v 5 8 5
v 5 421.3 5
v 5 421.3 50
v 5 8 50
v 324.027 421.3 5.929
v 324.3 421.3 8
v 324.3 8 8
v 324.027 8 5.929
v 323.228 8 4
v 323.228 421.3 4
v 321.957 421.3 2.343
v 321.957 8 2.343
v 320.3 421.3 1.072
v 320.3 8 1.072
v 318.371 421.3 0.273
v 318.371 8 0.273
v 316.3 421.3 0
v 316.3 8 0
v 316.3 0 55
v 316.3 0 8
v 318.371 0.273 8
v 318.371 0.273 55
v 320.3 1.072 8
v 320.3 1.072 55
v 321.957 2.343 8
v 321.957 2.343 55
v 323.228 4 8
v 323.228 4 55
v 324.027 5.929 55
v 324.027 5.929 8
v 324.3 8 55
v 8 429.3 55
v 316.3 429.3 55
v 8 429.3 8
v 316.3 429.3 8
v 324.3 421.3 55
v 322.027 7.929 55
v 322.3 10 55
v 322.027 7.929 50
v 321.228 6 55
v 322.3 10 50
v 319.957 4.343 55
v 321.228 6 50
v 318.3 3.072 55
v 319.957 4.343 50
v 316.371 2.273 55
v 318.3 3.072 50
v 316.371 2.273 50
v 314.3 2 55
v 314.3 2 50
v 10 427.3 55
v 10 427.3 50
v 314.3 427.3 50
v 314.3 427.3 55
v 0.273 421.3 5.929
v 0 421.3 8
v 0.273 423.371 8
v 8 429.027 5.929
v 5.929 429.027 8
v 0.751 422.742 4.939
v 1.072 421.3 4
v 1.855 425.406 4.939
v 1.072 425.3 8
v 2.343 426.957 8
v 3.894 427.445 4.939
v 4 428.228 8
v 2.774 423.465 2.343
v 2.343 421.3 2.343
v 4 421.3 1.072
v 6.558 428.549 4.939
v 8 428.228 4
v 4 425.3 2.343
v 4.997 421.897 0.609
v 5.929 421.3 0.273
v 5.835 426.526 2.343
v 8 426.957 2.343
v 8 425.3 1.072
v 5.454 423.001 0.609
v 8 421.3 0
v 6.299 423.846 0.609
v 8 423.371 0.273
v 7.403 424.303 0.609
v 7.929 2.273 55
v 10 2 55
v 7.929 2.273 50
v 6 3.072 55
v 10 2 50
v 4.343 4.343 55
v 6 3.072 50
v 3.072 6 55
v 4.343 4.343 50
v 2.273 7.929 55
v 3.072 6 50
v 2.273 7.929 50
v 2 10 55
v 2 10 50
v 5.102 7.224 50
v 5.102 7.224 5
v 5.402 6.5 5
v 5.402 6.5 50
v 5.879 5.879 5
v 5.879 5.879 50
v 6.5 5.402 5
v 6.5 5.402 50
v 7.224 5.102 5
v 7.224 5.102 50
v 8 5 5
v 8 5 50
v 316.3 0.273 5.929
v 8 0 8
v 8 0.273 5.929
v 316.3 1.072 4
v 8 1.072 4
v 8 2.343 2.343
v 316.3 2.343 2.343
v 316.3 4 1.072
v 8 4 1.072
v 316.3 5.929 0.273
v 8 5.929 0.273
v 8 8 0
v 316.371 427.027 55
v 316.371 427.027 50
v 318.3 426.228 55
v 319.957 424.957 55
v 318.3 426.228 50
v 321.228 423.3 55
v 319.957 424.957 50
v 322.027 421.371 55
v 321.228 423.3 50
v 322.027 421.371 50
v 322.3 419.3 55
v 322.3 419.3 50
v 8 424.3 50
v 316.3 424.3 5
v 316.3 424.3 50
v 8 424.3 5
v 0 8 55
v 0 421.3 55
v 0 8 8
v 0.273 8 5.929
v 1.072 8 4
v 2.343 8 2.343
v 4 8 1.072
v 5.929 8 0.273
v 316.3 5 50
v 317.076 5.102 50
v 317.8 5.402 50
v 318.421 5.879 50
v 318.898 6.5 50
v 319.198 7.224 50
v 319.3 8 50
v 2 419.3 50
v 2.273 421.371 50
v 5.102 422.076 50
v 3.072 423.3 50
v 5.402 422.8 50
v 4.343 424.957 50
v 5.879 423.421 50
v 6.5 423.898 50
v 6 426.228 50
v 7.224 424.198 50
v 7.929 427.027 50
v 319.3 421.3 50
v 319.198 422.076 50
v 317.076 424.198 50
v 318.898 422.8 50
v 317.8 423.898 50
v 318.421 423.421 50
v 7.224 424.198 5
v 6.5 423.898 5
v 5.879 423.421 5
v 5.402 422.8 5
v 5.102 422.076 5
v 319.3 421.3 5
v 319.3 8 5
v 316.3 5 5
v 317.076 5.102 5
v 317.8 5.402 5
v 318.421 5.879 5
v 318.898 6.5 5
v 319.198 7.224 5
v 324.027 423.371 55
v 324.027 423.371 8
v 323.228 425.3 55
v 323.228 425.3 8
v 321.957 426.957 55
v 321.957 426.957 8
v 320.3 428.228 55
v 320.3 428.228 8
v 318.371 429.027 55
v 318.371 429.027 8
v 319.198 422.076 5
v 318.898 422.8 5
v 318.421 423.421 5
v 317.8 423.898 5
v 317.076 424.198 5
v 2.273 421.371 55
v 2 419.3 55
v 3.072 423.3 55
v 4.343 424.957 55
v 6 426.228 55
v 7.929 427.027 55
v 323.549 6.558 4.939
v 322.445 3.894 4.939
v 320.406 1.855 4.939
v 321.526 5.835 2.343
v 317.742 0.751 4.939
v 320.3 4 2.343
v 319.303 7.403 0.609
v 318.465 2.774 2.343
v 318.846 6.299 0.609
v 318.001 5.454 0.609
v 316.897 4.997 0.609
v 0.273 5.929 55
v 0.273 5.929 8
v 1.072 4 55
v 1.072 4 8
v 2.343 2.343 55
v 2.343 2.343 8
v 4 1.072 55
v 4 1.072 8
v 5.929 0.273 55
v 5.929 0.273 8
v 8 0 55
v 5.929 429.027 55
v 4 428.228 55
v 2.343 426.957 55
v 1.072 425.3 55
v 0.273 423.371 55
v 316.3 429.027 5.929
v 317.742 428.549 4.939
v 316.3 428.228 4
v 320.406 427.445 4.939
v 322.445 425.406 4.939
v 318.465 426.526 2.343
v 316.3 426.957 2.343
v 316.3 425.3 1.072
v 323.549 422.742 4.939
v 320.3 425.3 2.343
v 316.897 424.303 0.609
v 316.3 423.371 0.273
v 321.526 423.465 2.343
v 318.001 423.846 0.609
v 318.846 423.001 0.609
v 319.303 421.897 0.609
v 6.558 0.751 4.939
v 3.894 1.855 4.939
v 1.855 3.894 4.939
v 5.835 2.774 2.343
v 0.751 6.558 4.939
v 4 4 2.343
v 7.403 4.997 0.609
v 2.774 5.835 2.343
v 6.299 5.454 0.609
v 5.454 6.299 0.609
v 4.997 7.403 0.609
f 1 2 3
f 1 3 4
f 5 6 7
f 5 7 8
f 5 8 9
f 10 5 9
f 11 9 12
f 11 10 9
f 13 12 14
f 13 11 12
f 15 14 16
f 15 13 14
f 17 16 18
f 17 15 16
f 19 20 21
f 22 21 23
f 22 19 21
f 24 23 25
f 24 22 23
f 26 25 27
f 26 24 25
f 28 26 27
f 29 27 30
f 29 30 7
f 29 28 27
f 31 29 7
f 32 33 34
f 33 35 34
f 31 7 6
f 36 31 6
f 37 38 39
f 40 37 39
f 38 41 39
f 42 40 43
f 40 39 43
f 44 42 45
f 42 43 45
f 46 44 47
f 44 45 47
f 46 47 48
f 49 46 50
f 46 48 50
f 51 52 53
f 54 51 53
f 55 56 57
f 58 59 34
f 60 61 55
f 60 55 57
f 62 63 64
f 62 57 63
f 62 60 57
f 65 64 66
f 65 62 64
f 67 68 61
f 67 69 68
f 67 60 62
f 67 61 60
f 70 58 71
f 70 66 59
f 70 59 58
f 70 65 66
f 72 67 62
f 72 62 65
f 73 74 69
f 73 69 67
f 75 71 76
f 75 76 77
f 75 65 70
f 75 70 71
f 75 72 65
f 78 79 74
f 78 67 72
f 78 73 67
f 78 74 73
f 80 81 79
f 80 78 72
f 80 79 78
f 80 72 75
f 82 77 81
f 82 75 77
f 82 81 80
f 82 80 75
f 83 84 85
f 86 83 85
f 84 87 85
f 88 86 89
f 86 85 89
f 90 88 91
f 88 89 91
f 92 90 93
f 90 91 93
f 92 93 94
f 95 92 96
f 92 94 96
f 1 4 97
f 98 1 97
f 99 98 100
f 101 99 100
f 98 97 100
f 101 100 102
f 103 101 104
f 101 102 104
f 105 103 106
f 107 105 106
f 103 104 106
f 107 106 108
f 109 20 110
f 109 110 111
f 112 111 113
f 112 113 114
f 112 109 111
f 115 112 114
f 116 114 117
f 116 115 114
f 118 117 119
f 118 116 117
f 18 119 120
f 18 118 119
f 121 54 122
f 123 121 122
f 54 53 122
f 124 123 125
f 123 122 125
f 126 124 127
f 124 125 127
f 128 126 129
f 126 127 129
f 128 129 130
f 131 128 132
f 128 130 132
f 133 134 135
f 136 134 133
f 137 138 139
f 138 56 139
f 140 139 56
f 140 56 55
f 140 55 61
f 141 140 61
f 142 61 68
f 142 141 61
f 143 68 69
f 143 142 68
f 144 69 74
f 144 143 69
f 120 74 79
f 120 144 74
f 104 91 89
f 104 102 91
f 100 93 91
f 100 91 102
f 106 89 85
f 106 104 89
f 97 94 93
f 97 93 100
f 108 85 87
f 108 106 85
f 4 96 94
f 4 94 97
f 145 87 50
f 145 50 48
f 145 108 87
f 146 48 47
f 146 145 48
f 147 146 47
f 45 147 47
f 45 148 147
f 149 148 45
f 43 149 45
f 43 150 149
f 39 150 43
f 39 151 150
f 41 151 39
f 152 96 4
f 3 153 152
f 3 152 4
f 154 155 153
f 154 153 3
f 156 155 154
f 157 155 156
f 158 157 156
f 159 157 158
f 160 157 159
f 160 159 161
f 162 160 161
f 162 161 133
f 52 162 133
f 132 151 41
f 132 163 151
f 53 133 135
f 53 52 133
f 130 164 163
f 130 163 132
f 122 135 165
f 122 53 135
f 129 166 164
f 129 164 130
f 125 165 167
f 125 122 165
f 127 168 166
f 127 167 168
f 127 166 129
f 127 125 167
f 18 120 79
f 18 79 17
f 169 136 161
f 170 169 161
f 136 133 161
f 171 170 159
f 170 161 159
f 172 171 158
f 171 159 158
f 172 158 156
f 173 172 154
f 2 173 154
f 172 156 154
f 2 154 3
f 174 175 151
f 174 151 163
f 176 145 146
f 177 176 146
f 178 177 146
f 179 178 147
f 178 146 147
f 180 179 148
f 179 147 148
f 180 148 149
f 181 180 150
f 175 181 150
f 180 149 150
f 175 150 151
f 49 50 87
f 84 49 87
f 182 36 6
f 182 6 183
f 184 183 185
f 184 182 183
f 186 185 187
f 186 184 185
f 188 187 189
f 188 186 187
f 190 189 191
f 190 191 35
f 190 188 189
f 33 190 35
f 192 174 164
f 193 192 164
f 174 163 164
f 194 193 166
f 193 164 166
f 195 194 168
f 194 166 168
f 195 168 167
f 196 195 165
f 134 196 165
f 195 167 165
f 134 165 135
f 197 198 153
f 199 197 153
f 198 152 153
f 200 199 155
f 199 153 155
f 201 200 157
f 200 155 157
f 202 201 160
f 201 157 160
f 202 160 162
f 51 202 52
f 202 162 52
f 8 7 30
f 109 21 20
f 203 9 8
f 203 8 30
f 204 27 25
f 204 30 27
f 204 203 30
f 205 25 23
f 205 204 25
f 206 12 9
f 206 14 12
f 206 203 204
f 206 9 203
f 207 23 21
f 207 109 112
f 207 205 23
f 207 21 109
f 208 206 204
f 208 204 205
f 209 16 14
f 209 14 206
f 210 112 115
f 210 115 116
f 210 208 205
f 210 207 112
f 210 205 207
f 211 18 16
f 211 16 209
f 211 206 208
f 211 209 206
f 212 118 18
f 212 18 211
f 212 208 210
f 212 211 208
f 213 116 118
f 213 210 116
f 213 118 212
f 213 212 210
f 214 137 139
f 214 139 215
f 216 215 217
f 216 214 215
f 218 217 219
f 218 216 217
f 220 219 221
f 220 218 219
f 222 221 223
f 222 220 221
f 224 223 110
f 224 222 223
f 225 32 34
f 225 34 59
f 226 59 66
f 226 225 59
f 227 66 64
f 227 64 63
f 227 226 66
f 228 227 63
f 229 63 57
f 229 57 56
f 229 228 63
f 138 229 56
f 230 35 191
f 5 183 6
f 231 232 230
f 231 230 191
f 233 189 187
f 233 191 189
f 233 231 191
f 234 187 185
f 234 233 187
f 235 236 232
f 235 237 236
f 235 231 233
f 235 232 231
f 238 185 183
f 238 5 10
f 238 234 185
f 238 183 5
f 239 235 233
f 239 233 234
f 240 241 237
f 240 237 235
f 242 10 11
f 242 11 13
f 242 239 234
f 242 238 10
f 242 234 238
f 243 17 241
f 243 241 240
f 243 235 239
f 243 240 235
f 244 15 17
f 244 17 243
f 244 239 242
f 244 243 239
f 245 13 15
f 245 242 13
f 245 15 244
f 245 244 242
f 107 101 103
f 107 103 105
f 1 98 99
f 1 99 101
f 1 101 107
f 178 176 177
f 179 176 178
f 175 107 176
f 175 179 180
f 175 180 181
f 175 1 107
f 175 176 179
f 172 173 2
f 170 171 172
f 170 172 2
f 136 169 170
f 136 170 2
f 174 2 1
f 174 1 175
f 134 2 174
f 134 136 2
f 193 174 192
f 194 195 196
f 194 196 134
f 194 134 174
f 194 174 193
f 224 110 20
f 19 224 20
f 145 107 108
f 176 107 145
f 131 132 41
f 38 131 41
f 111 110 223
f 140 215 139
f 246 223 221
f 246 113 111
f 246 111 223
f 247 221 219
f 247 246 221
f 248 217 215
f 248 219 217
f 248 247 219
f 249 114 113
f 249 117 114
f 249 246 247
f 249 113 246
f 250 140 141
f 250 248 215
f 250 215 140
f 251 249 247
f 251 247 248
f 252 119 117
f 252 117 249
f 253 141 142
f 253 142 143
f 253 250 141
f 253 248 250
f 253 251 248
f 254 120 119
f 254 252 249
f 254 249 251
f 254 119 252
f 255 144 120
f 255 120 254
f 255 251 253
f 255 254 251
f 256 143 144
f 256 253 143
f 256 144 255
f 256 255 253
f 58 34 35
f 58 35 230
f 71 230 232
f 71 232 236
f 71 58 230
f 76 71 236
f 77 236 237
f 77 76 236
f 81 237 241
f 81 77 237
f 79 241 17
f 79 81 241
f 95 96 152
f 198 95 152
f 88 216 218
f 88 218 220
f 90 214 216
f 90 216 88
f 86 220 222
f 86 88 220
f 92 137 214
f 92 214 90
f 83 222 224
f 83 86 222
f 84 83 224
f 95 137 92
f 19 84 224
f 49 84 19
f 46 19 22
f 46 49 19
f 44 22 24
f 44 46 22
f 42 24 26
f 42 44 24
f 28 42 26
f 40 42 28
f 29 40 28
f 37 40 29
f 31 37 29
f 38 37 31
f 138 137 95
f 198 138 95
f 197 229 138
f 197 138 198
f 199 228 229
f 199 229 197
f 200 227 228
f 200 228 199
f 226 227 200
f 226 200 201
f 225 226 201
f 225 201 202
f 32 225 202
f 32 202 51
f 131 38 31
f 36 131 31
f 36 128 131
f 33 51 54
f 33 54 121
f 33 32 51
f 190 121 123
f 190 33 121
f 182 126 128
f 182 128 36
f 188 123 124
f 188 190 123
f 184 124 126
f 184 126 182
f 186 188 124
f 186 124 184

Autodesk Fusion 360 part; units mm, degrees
sketch "Sketch1" plane through (0, 0, 0) normal (0, 0, 1) x (1, 0, 0)
  line L0 (0, 0) -> (324.3, 0)
  line L1 (324.3, 0) -> (324.3, 429.3)
  line L2 (324.3, 429.3) -> (0, 429.3)
  line L3 (0, 429.3) -> (0, 0)
  dimension "d7" = 324.3
  dimension "d8" = 429.3
extrude "Extrude1" add sketch "Sketch1" along normal blind 55
fillet "Fillet1" radius 8 4 edges at (324.3, 0, 27.5) (324.3, 429.3, 27.5) (0, 429.3, 27.5) (0, 0, 27.5)
shell "Shell1" thickness 5 removed faces 1 at (216.2, 283.5333, 55)
ref_plane "WorkPlane1" through (162.15, 214.65, 50) normal (0, 0, 1) x (1, 0, 0)
sketch "Sketch2" plane through (0, 0, 50) normal (0, 0, 1) x (1, 0, 0)
  line L0 (10, 427.3) -> (314.3, 427.3)
  line L1 (322.3, 419.3) -> (322.3, 10)
  line L2 (314.3, 2) -> (10, 2)
  line L3 (2, 10) -> (2, 419.3)
  arc A0 (8, 424.3) -> (5, 421.3) centre (8, 421.3) ccw
  line L4 (8, 424.3) -> (316.3, 424.3)
  arc A1 (319.3, 421.3) -> (316.3, 424.3) centre (316.3, 421.3) ccw
  line L5 (319.3, 421.3) -> (319.3, 8)
  arc A2 (316.3, 5) -> (319.3, 8) centre (316.3, 8) ccw
  line L6 (316.3, 5) -> (8, 5)
  arc A3 (5, 8) -> (8, 5) centre (8, 8) ccw
  line L7 (5, 8) -> (5, 421.3)
  arc A4 (0, 8) -> (8, 0) centre (8, 8) ccw
  line L8 (8, 0) -> (316.3, 0)
  arc A5 (316.3, 0) -> (324.3, 8) centre (316.3, 8) ccw
  line L9 (324.3, 8) -> (324.3, 421.3)
  arc A6 (324.3, 421.3) -> (316.3, 429.3) centre (316.3, 421.3) ccw
  line L10 (316.3, 429.3) -> (8, 429.3)
  arc A7 (8, 429.3) -> (0, 421.3) centre (8, 421.3) ccw
  line L11 (0, 421.3) -> (0, 8)
  arc A8 (2, 10) -> (10, 2) centre (10, 10) ccw
  arc A9 (10, 427.3) -> (2, 419.3) centre (10, 419.3) ccw
  arc A10 (322.3, 419.3) -> (314.3, 427.3) centre (314.3, 419.3) ccw
  arc A11 (314.3, 2) -> (322.3, 10) centre (314.3, 10) ccw
  dimension "d19" = 2
  dimension "d20" = 2
  dimension "d21" = 2
  dimension "d22" = 2
  dimension "d23" = 8
extrude "Extrude2" cut sketch "Sketch2" along normal through all contours L0 L1 L2 L3 A8 A9 A10 A11
fillet "Fillet2" radius 8 1 faces at (216.2, 283.5333, 0)
equation "tray_depth = panel_depth + 2 * ( wall_thickness - lip_thickness ) + printer_tolerance"
equation "tray_width = panel_width + 2 * ( wall_thickness - lip_thickness ) + printer_tolerance"
equation "wall_height = 55 mm"
equation "wall_thickness = 2 mm + lip_thickness"
equation "corner_radius = 8 mm"
equation "lip_depth = 5 mm"
equation "d7 = tray_width"
equation "d8 = tray_depth"
equation "d9 = wall_height"
equation "d12 = corner_radius"
equation "d13 = wall_thickness"
equation "panel_width = 320 mm"
equation "panel_depth = 425 mm"
equation "lip_thickness = 3 mm"
equation "printer_tolerance = 0.3 mm"
equation "d18 = -lip_depth"
equation "d19 = wall_thickness - lip_thickness"
equation "d20 = wall_thickness - lip_thickness"
equation "d21 = wall_thickness - lip_thickness"
equation "d22 = wall_thickness - lip_thickness"
equation "d23 = corner_radius"
equation "d26 = corner_radius"
